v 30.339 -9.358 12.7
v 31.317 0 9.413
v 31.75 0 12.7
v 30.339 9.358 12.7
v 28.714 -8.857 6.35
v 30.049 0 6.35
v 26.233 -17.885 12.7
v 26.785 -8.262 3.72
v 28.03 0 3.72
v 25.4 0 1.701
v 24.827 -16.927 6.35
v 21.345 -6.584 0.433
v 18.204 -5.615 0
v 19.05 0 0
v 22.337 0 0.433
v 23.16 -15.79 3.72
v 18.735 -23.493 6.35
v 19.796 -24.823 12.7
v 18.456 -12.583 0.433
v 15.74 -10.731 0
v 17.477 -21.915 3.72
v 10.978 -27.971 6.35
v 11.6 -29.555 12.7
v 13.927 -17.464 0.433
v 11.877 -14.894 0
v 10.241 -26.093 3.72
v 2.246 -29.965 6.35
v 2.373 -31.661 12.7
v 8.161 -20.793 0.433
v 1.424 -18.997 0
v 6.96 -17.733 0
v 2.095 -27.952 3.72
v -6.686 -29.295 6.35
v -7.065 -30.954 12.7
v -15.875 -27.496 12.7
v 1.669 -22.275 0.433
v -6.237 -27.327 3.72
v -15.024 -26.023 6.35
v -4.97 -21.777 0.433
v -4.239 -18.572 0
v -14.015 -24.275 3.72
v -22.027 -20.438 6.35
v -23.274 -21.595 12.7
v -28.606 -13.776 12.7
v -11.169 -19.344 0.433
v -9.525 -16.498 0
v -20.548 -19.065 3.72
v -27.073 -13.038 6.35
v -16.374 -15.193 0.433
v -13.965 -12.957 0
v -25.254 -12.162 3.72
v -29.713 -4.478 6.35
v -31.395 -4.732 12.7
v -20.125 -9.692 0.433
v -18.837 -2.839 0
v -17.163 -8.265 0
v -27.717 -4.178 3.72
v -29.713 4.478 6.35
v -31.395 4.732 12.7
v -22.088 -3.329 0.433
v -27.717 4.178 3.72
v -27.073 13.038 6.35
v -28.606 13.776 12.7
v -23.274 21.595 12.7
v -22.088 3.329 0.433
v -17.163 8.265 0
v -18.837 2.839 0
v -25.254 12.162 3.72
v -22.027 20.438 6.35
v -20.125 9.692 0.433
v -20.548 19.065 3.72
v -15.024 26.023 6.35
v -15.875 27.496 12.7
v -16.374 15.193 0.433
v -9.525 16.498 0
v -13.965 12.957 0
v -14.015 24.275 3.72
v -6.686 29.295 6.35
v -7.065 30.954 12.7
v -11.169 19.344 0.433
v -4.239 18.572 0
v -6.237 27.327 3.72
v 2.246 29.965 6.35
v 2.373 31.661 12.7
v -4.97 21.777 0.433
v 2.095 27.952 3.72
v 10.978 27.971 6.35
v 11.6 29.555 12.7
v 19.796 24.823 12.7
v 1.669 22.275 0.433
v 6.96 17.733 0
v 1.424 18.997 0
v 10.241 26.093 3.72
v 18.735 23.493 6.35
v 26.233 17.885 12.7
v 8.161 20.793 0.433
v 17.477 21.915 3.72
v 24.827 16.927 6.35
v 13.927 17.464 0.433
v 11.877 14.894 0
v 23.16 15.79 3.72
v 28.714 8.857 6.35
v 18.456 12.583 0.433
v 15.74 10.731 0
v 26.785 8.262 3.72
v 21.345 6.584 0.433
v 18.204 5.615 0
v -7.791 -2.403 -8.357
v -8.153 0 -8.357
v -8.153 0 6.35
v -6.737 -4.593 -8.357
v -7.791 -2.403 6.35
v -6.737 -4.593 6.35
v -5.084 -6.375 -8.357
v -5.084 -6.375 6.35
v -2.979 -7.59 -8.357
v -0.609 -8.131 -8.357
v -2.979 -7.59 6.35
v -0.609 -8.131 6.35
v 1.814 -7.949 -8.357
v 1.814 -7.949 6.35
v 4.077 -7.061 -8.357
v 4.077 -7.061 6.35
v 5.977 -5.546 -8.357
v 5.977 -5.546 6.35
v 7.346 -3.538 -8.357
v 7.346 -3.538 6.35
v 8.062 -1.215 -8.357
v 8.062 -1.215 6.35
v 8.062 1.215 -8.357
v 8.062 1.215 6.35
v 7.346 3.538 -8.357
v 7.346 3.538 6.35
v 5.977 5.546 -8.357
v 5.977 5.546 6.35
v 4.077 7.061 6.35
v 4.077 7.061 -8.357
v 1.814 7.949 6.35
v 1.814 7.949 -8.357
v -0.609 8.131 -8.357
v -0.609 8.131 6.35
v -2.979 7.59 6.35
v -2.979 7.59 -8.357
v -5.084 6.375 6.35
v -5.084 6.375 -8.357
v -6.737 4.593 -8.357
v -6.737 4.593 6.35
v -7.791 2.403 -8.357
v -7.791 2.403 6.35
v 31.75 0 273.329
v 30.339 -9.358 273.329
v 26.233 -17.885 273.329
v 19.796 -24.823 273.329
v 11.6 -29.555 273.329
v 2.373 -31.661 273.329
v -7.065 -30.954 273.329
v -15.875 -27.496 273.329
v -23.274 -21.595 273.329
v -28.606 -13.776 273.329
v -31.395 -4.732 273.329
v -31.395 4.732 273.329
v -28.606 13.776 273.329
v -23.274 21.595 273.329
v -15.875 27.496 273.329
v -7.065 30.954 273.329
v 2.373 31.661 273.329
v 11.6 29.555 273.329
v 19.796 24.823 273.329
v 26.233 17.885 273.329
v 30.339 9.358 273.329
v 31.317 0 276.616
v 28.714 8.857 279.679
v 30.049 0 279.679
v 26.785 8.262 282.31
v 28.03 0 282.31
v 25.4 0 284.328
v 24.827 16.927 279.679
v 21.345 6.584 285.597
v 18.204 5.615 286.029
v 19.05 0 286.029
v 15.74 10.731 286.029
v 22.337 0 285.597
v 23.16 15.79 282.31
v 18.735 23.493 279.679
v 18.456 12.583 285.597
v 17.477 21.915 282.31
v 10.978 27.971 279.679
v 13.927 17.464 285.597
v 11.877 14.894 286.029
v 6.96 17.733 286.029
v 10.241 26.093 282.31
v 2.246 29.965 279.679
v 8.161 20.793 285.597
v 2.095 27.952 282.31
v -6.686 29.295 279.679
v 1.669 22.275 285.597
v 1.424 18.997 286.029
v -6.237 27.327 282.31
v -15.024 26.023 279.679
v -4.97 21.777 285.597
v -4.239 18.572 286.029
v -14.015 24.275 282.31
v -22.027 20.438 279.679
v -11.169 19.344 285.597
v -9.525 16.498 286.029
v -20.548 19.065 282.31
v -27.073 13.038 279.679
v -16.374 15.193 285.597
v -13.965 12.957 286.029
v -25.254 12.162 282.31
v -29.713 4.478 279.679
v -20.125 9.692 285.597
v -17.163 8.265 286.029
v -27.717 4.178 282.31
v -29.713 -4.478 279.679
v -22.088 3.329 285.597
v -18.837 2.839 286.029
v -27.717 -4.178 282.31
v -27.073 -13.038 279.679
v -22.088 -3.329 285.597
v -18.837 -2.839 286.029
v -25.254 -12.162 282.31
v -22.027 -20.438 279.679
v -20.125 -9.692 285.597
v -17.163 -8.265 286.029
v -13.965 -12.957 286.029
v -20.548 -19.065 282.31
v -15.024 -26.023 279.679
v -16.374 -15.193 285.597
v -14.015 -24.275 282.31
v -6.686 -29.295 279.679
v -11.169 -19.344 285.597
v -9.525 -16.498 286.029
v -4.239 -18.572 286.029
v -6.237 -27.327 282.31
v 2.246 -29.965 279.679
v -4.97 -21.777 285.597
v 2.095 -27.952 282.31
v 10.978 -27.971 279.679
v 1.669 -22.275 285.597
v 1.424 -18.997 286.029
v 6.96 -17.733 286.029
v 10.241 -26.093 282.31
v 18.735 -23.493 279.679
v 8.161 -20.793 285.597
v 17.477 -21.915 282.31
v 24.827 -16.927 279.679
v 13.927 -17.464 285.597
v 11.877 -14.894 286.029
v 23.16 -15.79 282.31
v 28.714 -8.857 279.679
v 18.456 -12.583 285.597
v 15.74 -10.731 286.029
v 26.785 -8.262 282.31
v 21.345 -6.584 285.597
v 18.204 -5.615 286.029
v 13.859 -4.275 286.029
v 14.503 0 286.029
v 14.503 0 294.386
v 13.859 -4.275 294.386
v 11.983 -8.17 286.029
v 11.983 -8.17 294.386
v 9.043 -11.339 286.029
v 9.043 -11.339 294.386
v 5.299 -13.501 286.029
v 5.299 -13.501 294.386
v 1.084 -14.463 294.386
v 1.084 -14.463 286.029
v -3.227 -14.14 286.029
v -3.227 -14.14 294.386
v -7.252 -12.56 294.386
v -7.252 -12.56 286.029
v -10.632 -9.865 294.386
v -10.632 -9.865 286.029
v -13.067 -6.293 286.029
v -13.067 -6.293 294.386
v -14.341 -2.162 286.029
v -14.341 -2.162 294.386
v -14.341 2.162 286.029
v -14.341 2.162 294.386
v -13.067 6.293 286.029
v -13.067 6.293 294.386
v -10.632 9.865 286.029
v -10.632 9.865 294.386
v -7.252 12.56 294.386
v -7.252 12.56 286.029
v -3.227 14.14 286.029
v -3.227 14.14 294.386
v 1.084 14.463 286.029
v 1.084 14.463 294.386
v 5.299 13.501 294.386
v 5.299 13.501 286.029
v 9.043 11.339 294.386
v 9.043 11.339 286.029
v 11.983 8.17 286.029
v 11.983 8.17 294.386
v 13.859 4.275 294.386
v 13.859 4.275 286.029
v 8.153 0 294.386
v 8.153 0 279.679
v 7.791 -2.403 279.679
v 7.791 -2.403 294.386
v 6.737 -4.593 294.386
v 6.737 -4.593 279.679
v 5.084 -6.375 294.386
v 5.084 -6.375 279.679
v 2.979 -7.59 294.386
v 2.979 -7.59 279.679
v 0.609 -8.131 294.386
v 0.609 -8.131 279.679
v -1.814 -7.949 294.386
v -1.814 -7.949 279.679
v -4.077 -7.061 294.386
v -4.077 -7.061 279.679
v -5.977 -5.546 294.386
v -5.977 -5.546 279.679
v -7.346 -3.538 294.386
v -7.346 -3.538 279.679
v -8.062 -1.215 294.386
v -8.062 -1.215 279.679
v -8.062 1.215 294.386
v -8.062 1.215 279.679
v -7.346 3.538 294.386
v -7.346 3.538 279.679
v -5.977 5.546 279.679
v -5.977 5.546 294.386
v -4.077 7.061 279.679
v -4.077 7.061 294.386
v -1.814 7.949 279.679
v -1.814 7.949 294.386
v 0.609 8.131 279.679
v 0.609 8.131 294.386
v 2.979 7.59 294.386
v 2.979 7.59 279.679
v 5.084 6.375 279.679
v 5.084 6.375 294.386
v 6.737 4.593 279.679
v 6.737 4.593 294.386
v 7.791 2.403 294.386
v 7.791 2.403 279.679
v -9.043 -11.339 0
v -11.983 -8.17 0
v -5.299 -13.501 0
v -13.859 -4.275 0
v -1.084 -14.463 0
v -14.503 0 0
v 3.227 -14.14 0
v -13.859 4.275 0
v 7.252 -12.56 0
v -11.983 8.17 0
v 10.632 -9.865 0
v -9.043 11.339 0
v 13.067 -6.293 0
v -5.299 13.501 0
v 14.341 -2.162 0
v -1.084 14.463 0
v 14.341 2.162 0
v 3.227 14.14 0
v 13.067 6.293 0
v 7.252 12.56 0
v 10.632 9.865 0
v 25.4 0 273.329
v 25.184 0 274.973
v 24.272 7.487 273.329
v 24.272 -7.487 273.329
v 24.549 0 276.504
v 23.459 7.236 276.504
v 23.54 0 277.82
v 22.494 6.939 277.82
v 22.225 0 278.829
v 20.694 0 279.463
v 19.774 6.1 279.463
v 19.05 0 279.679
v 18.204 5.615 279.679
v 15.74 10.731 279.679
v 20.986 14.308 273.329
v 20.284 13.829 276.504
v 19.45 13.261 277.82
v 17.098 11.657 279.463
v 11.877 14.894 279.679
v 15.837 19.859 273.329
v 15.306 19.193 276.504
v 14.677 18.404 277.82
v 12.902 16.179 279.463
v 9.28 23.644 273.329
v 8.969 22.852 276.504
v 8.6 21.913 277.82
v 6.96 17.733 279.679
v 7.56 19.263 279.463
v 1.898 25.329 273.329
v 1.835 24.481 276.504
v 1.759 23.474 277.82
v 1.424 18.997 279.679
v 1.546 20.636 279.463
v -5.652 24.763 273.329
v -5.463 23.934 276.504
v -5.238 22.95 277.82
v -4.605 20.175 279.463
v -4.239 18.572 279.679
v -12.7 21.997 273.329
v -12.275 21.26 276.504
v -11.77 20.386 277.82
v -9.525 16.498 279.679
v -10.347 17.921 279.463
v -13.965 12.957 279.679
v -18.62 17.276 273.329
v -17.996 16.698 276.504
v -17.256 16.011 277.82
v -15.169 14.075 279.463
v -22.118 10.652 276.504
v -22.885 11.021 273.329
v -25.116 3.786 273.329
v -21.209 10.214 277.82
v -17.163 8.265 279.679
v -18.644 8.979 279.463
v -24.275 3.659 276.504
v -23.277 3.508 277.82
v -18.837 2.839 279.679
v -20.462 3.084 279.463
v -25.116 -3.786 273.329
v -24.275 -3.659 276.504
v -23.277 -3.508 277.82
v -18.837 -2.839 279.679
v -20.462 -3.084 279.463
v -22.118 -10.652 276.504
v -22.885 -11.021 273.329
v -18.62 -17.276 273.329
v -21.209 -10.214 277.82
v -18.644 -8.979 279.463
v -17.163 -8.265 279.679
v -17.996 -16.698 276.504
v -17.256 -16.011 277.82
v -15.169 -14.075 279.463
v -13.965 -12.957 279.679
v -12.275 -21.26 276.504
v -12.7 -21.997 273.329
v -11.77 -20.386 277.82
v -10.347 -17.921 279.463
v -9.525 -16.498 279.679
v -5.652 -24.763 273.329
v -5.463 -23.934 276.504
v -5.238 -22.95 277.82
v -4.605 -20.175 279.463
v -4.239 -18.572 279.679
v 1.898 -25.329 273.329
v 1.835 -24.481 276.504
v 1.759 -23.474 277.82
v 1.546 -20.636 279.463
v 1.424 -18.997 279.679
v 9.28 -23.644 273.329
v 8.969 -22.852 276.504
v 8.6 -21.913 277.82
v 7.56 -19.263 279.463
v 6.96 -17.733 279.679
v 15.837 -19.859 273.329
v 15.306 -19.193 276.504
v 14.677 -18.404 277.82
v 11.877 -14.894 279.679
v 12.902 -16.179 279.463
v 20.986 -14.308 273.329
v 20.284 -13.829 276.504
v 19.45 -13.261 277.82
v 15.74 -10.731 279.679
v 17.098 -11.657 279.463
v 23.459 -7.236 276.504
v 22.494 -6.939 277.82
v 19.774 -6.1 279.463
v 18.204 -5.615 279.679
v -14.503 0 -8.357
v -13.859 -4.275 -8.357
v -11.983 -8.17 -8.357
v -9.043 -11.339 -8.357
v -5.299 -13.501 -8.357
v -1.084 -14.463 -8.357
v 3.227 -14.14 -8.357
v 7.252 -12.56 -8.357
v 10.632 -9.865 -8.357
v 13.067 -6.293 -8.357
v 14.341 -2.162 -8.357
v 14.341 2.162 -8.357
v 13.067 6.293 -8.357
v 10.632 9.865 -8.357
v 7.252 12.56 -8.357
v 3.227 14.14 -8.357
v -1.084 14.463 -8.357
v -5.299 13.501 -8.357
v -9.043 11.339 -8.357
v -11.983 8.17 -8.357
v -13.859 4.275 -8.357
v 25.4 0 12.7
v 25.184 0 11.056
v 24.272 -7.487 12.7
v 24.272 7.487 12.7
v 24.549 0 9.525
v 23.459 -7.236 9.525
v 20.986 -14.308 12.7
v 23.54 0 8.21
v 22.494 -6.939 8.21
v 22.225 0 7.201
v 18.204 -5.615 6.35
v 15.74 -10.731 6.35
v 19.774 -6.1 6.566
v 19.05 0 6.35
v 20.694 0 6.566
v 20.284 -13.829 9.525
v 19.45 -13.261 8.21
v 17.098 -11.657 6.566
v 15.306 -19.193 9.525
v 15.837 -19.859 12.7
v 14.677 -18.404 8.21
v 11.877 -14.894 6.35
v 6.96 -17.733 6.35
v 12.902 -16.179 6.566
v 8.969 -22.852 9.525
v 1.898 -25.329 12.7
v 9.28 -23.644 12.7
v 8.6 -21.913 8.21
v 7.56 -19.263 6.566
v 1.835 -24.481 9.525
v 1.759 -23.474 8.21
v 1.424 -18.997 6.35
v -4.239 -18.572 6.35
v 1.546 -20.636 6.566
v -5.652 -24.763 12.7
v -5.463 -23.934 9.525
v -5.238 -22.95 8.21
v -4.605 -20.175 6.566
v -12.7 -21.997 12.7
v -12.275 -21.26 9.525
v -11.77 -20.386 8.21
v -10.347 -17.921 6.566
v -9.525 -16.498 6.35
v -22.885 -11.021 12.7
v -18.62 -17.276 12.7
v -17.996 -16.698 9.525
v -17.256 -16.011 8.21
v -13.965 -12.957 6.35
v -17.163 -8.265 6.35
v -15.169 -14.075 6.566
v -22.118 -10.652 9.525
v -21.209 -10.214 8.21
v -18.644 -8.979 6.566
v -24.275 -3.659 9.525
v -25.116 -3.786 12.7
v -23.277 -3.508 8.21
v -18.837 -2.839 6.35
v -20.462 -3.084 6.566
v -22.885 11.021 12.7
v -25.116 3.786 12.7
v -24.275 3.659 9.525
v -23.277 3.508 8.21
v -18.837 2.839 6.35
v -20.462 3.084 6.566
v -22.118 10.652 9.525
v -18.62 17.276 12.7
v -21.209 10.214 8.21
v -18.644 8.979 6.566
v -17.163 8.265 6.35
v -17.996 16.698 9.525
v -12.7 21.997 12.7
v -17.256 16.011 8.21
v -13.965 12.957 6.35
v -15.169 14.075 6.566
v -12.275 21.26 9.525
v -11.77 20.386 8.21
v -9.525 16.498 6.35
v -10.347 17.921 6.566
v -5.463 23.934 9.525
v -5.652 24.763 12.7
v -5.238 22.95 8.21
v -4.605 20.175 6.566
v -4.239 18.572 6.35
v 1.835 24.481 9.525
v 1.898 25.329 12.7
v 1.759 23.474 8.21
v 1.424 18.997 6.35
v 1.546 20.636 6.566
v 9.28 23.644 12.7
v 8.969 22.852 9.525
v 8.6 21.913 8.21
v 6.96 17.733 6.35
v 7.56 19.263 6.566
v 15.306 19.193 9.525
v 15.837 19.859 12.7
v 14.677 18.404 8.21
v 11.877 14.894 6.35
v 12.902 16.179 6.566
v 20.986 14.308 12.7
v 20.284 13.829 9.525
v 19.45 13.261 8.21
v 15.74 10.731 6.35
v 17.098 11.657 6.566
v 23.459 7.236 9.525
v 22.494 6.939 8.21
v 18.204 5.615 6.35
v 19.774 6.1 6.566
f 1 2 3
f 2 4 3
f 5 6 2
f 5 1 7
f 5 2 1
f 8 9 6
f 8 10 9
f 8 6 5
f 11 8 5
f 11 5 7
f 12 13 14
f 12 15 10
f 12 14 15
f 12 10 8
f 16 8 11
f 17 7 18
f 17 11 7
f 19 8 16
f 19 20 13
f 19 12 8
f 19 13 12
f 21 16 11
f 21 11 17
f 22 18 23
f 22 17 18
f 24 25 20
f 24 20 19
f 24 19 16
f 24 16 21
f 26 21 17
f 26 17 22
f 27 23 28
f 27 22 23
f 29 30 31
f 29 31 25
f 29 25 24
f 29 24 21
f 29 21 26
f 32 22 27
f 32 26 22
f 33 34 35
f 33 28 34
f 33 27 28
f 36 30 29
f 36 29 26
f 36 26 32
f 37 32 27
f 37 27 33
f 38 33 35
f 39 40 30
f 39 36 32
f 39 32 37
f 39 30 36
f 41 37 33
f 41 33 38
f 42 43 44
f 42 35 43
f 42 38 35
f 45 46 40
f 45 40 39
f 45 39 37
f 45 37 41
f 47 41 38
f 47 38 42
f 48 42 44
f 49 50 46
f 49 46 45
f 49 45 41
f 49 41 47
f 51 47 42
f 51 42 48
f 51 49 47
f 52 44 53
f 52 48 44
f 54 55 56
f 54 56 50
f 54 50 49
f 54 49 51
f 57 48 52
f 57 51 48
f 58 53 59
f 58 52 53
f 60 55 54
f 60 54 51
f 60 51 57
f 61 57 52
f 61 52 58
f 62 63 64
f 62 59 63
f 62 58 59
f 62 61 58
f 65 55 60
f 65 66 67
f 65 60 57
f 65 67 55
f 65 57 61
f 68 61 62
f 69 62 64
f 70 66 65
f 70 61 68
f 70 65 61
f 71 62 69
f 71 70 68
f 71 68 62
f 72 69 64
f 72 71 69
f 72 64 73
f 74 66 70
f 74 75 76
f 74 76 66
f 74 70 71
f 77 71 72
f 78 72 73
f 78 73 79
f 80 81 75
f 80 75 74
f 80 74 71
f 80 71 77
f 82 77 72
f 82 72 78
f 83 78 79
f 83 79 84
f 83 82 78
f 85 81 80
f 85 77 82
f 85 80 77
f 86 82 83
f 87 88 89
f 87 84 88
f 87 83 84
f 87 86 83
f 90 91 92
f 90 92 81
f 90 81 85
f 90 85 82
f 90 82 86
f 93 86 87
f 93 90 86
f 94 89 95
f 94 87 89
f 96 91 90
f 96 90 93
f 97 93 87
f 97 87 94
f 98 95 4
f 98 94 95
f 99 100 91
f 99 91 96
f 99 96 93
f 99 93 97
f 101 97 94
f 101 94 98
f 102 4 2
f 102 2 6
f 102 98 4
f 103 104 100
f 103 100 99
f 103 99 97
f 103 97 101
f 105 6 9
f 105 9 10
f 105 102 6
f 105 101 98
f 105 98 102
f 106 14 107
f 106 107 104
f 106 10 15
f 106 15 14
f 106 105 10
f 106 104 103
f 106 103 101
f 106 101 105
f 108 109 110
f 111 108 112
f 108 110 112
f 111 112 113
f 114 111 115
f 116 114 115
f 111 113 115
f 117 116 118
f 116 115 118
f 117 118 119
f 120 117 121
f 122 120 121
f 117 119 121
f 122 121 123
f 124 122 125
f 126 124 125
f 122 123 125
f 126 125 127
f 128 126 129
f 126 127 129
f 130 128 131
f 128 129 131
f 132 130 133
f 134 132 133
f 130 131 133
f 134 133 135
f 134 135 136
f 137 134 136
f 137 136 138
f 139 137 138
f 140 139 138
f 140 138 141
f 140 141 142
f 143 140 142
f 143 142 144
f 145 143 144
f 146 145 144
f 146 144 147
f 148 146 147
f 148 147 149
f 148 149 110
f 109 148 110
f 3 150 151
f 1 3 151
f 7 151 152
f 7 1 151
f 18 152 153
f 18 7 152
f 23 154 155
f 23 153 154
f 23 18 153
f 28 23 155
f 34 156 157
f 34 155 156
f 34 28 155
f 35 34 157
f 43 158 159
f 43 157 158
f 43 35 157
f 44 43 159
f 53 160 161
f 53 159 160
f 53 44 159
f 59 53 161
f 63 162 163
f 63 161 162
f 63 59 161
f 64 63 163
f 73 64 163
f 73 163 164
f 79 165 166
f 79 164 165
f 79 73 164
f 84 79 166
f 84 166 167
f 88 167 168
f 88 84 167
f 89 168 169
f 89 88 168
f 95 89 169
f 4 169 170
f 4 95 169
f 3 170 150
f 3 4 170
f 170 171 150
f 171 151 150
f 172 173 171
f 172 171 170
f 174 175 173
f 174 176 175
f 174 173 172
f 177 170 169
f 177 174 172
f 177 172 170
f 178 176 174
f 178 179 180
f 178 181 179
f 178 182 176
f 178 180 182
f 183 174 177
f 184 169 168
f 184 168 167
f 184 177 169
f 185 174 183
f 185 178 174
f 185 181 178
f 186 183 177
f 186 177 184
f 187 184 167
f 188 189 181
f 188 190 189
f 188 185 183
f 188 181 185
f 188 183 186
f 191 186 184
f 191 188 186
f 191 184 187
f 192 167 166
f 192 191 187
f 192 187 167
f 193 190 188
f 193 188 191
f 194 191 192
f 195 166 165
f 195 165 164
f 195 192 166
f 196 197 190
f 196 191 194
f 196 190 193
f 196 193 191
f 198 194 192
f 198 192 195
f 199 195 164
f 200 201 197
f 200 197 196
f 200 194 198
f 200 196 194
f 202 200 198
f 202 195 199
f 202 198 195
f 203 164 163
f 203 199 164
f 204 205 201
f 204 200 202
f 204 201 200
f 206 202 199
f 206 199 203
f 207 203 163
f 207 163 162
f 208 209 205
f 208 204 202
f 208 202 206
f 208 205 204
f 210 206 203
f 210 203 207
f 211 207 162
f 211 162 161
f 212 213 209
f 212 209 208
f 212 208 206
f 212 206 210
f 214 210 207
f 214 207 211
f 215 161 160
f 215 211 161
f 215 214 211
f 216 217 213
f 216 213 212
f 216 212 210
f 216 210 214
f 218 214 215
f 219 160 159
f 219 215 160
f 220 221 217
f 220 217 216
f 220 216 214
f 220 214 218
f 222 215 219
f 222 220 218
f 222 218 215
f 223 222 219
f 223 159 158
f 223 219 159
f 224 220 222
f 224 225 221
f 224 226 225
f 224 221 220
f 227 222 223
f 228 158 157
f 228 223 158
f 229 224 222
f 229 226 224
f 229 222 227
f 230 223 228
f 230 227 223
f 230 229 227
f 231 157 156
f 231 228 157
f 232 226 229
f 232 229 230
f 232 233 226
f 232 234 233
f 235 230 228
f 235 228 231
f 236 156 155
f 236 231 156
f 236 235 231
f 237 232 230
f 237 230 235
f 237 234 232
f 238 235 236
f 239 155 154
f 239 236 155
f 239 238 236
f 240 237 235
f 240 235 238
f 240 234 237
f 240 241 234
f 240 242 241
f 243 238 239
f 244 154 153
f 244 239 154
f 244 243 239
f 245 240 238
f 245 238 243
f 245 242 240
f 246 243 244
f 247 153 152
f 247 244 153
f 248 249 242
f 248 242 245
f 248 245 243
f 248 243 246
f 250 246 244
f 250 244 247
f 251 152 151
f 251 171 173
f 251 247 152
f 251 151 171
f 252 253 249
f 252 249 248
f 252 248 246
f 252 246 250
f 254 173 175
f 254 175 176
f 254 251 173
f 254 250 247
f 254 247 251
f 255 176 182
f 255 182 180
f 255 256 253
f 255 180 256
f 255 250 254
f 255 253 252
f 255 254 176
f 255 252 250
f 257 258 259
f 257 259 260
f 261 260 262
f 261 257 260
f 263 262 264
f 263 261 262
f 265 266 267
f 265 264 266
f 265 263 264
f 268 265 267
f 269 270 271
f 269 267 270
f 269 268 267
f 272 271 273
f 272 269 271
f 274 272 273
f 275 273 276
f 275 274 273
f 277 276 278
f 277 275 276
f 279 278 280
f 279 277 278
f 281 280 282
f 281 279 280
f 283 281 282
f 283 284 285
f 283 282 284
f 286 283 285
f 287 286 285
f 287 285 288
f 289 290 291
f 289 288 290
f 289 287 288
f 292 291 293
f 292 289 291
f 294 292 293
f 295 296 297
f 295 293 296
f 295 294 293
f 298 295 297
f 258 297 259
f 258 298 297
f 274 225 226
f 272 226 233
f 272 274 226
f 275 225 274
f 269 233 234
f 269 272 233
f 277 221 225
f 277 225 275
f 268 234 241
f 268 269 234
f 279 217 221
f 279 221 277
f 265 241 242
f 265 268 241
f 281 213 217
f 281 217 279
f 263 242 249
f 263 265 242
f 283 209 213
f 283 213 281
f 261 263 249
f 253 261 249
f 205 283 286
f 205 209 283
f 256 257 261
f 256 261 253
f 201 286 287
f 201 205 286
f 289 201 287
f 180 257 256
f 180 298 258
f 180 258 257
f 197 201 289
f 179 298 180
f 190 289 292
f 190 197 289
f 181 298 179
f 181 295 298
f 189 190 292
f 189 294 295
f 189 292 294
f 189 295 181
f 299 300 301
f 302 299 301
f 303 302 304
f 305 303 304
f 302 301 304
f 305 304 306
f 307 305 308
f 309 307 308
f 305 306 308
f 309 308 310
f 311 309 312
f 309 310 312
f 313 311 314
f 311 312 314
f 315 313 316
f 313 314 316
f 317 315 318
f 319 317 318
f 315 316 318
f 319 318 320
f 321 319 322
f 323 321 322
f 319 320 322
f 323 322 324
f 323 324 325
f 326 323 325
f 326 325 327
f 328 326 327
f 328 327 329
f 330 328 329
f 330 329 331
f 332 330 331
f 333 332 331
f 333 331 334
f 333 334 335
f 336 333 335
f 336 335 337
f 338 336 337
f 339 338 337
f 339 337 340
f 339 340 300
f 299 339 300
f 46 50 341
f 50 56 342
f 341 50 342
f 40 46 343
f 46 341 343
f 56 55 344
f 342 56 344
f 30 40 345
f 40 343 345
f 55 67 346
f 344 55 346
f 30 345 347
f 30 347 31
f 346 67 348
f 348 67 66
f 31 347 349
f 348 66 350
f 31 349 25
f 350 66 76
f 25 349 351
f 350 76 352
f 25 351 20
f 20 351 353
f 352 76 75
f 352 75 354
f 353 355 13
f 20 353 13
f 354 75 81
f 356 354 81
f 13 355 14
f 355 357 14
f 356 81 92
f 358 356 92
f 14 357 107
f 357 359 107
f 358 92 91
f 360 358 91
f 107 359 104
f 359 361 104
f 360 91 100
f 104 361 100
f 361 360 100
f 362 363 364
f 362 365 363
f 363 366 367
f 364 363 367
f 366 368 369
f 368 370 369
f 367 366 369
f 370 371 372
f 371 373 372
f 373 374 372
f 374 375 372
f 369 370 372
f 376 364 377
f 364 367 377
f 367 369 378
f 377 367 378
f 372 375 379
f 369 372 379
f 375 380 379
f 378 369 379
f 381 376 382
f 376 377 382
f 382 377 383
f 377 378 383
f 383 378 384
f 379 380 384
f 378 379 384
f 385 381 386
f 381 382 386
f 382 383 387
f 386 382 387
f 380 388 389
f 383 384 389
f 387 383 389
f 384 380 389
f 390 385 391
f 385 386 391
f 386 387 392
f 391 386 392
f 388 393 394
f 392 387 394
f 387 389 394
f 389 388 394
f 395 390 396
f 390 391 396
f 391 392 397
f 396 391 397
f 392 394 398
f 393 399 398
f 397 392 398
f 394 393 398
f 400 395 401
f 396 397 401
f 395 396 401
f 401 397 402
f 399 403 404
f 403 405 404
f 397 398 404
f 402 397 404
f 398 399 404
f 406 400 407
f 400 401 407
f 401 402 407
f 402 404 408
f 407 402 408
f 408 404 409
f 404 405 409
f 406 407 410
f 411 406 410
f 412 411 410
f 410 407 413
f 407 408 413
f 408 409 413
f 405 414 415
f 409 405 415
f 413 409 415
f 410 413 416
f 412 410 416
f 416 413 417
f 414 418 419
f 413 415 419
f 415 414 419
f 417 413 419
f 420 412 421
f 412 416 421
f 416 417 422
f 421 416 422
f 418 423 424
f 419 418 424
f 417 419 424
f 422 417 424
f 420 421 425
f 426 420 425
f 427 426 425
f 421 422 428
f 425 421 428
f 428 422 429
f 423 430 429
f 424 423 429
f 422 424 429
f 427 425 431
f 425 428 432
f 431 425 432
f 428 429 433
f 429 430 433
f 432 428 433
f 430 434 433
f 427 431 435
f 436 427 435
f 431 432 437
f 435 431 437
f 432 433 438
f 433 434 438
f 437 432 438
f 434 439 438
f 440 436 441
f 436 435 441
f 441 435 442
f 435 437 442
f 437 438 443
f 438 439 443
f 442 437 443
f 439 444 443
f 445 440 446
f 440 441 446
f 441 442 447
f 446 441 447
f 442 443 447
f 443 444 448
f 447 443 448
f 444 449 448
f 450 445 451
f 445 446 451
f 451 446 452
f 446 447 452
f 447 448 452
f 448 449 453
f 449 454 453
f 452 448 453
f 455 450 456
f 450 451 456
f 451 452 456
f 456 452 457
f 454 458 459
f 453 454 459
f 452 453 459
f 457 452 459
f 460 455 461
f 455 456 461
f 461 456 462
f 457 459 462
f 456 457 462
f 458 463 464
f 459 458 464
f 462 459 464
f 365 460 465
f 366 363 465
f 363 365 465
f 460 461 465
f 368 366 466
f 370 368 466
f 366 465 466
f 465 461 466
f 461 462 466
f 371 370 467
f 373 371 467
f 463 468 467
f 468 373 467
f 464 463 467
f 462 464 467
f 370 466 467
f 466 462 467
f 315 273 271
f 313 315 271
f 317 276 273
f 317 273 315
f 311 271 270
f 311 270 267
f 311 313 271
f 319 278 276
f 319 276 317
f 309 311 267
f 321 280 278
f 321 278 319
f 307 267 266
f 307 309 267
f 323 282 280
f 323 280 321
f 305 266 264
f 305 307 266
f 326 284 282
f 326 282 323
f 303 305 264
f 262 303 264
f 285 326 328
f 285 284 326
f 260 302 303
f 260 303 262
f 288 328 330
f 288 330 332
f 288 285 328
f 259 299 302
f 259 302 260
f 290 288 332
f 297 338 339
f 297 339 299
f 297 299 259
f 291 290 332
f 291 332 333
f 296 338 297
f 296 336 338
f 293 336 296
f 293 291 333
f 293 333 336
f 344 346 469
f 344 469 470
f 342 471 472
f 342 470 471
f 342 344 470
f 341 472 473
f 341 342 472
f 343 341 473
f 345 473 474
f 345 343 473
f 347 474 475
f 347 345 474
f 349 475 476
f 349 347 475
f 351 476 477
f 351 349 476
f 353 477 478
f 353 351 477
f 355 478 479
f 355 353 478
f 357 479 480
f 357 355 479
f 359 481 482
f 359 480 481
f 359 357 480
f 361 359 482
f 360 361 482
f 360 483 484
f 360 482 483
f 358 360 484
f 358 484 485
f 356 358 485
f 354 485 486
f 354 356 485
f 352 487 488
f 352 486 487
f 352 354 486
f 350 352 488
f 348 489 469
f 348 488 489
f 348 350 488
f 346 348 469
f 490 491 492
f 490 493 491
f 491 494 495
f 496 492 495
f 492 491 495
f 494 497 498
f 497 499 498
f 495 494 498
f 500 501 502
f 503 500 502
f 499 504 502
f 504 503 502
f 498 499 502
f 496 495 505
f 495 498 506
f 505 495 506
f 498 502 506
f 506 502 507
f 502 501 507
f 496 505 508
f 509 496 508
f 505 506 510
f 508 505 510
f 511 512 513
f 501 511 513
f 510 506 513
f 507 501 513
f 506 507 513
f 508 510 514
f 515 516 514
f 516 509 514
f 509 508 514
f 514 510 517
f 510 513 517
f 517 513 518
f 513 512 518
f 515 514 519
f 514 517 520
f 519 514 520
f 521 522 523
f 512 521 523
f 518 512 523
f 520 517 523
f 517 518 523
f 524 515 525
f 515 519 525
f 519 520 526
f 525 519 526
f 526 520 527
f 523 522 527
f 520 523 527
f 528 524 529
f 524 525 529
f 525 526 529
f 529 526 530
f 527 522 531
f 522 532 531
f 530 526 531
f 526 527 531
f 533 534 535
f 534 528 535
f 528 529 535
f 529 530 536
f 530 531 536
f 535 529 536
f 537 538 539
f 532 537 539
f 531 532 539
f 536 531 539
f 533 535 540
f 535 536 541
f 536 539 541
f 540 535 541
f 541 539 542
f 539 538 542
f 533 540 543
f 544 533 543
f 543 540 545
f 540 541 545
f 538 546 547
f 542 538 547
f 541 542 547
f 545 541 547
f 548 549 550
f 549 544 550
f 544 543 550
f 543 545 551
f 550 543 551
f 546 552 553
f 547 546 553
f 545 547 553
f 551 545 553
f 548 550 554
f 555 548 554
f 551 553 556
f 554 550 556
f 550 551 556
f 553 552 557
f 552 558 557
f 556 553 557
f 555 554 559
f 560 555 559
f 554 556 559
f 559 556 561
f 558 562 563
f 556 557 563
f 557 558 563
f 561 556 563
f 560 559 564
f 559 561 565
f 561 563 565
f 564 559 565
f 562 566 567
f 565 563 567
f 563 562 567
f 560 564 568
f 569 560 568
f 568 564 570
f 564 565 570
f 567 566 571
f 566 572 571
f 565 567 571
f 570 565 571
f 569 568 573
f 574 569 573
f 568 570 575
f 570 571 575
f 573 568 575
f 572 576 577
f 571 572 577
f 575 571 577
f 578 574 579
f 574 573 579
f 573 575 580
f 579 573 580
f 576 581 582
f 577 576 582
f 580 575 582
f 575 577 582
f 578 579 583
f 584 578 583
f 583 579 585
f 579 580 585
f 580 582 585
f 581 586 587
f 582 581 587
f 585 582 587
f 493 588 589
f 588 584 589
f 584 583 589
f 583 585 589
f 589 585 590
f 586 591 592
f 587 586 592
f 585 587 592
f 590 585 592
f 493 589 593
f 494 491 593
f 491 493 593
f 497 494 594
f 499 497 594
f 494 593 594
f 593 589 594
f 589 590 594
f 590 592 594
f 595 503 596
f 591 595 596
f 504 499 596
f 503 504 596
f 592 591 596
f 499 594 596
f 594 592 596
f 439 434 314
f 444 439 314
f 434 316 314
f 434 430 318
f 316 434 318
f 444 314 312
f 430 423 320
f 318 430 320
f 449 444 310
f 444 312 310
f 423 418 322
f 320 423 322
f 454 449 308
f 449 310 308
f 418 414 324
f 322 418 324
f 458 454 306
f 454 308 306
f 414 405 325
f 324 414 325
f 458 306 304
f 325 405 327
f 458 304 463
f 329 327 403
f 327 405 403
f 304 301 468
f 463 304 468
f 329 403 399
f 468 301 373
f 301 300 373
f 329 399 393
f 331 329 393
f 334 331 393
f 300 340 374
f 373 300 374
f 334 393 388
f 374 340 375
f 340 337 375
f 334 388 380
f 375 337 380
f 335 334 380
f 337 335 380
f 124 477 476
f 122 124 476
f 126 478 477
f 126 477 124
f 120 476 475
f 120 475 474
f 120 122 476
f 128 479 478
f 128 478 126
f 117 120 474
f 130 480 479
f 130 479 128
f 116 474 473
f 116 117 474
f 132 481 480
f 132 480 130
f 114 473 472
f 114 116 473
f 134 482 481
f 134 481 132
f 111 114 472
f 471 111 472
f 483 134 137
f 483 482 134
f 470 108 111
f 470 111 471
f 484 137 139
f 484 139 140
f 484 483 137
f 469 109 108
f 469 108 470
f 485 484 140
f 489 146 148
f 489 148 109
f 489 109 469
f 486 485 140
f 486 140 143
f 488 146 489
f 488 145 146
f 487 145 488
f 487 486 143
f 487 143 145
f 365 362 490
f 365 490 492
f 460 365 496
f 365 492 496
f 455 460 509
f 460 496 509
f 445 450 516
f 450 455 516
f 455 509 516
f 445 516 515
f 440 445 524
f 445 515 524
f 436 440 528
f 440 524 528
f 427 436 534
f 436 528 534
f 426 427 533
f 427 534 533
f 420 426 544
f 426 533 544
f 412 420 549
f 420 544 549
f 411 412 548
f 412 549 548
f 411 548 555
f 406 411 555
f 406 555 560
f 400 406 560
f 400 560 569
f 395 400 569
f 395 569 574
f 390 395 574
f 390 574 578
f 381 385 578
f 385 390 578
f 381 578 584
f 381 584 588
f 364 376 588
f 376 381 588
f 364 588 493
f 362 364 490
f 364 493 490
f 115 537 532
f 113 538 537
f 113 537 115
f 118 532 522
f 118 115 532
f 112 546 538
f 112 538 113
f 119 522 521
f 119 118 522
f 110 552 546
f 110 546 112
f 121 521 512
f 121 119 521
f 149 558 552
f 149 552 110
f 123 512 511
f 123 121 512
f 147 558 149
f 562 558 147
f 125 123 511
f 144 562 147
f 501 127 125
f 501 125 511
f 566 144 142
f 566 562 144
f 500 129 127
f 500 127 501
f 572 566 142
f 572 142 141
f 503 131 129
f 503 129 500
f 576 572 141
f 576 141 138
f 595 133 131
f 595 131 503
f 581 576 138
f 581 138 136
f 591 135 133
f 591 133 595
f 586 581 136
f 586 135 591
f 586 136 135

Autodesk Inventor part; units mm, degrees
ref_plane "YZ Plane" through (0, 0, 0) normal (1, 0, 0) x (0, 1, 0)
ref_plane "XZ Plane" through (0, 0, 0) normal (0, 1, 0) x (-1, 0, 0)
ref_plane "XY Plane" through (0, 0, 0) normal (0, 0, 1) x (1, 0, 0)
sketch "Sketch1" plane through (0, 0, 0) normal (0, 0, 1) x (1, 0, 0)
  circle A0 centre (0, 0) radius 31.75
  dimension "d0" = 63.5
extrude "Extrusion1" add sketch "Sketch1" along normal blind 286.0294
sketch "Sketch2" plane through (0, 0, 286.0294) normal (0, 0, 1) x (1, 0, 0)
  circle A0 centre (0, 0) radius 31.75 projected
  circle A1 centre (0, 0) radius 14.5034
  dimension "d3" = 29.0068
extrude "Extrusion2" add sketch "Sketch2" along normal blind 8.3566 contours A1
sketch "Sketch3" plane through (0, 0, 0) normal (0, 0, -1) x (-1, 0, 0)
  circle A0 centre (0, 0) radius 31.75 projected
  circle A1 centre (0, 0) radius 14.5034
  dimension "d6" = 29.0068
extrude "Extrusion3" add sketch "Sketch3" along normal blind 8.3566 contours A1
fillet "Fillet1" radius 12.7 2 edges at (-31.75, 0, 0) (-31.75, 0, 286.0294)
shell "Shell1" thickness 6.35 removed faces 2 at (0.6824, -3.9787, -8.3566) at (-0.6824, -3.9787, 294.386)
properties part number "Pneuare Tank" material "Polypropylene"
